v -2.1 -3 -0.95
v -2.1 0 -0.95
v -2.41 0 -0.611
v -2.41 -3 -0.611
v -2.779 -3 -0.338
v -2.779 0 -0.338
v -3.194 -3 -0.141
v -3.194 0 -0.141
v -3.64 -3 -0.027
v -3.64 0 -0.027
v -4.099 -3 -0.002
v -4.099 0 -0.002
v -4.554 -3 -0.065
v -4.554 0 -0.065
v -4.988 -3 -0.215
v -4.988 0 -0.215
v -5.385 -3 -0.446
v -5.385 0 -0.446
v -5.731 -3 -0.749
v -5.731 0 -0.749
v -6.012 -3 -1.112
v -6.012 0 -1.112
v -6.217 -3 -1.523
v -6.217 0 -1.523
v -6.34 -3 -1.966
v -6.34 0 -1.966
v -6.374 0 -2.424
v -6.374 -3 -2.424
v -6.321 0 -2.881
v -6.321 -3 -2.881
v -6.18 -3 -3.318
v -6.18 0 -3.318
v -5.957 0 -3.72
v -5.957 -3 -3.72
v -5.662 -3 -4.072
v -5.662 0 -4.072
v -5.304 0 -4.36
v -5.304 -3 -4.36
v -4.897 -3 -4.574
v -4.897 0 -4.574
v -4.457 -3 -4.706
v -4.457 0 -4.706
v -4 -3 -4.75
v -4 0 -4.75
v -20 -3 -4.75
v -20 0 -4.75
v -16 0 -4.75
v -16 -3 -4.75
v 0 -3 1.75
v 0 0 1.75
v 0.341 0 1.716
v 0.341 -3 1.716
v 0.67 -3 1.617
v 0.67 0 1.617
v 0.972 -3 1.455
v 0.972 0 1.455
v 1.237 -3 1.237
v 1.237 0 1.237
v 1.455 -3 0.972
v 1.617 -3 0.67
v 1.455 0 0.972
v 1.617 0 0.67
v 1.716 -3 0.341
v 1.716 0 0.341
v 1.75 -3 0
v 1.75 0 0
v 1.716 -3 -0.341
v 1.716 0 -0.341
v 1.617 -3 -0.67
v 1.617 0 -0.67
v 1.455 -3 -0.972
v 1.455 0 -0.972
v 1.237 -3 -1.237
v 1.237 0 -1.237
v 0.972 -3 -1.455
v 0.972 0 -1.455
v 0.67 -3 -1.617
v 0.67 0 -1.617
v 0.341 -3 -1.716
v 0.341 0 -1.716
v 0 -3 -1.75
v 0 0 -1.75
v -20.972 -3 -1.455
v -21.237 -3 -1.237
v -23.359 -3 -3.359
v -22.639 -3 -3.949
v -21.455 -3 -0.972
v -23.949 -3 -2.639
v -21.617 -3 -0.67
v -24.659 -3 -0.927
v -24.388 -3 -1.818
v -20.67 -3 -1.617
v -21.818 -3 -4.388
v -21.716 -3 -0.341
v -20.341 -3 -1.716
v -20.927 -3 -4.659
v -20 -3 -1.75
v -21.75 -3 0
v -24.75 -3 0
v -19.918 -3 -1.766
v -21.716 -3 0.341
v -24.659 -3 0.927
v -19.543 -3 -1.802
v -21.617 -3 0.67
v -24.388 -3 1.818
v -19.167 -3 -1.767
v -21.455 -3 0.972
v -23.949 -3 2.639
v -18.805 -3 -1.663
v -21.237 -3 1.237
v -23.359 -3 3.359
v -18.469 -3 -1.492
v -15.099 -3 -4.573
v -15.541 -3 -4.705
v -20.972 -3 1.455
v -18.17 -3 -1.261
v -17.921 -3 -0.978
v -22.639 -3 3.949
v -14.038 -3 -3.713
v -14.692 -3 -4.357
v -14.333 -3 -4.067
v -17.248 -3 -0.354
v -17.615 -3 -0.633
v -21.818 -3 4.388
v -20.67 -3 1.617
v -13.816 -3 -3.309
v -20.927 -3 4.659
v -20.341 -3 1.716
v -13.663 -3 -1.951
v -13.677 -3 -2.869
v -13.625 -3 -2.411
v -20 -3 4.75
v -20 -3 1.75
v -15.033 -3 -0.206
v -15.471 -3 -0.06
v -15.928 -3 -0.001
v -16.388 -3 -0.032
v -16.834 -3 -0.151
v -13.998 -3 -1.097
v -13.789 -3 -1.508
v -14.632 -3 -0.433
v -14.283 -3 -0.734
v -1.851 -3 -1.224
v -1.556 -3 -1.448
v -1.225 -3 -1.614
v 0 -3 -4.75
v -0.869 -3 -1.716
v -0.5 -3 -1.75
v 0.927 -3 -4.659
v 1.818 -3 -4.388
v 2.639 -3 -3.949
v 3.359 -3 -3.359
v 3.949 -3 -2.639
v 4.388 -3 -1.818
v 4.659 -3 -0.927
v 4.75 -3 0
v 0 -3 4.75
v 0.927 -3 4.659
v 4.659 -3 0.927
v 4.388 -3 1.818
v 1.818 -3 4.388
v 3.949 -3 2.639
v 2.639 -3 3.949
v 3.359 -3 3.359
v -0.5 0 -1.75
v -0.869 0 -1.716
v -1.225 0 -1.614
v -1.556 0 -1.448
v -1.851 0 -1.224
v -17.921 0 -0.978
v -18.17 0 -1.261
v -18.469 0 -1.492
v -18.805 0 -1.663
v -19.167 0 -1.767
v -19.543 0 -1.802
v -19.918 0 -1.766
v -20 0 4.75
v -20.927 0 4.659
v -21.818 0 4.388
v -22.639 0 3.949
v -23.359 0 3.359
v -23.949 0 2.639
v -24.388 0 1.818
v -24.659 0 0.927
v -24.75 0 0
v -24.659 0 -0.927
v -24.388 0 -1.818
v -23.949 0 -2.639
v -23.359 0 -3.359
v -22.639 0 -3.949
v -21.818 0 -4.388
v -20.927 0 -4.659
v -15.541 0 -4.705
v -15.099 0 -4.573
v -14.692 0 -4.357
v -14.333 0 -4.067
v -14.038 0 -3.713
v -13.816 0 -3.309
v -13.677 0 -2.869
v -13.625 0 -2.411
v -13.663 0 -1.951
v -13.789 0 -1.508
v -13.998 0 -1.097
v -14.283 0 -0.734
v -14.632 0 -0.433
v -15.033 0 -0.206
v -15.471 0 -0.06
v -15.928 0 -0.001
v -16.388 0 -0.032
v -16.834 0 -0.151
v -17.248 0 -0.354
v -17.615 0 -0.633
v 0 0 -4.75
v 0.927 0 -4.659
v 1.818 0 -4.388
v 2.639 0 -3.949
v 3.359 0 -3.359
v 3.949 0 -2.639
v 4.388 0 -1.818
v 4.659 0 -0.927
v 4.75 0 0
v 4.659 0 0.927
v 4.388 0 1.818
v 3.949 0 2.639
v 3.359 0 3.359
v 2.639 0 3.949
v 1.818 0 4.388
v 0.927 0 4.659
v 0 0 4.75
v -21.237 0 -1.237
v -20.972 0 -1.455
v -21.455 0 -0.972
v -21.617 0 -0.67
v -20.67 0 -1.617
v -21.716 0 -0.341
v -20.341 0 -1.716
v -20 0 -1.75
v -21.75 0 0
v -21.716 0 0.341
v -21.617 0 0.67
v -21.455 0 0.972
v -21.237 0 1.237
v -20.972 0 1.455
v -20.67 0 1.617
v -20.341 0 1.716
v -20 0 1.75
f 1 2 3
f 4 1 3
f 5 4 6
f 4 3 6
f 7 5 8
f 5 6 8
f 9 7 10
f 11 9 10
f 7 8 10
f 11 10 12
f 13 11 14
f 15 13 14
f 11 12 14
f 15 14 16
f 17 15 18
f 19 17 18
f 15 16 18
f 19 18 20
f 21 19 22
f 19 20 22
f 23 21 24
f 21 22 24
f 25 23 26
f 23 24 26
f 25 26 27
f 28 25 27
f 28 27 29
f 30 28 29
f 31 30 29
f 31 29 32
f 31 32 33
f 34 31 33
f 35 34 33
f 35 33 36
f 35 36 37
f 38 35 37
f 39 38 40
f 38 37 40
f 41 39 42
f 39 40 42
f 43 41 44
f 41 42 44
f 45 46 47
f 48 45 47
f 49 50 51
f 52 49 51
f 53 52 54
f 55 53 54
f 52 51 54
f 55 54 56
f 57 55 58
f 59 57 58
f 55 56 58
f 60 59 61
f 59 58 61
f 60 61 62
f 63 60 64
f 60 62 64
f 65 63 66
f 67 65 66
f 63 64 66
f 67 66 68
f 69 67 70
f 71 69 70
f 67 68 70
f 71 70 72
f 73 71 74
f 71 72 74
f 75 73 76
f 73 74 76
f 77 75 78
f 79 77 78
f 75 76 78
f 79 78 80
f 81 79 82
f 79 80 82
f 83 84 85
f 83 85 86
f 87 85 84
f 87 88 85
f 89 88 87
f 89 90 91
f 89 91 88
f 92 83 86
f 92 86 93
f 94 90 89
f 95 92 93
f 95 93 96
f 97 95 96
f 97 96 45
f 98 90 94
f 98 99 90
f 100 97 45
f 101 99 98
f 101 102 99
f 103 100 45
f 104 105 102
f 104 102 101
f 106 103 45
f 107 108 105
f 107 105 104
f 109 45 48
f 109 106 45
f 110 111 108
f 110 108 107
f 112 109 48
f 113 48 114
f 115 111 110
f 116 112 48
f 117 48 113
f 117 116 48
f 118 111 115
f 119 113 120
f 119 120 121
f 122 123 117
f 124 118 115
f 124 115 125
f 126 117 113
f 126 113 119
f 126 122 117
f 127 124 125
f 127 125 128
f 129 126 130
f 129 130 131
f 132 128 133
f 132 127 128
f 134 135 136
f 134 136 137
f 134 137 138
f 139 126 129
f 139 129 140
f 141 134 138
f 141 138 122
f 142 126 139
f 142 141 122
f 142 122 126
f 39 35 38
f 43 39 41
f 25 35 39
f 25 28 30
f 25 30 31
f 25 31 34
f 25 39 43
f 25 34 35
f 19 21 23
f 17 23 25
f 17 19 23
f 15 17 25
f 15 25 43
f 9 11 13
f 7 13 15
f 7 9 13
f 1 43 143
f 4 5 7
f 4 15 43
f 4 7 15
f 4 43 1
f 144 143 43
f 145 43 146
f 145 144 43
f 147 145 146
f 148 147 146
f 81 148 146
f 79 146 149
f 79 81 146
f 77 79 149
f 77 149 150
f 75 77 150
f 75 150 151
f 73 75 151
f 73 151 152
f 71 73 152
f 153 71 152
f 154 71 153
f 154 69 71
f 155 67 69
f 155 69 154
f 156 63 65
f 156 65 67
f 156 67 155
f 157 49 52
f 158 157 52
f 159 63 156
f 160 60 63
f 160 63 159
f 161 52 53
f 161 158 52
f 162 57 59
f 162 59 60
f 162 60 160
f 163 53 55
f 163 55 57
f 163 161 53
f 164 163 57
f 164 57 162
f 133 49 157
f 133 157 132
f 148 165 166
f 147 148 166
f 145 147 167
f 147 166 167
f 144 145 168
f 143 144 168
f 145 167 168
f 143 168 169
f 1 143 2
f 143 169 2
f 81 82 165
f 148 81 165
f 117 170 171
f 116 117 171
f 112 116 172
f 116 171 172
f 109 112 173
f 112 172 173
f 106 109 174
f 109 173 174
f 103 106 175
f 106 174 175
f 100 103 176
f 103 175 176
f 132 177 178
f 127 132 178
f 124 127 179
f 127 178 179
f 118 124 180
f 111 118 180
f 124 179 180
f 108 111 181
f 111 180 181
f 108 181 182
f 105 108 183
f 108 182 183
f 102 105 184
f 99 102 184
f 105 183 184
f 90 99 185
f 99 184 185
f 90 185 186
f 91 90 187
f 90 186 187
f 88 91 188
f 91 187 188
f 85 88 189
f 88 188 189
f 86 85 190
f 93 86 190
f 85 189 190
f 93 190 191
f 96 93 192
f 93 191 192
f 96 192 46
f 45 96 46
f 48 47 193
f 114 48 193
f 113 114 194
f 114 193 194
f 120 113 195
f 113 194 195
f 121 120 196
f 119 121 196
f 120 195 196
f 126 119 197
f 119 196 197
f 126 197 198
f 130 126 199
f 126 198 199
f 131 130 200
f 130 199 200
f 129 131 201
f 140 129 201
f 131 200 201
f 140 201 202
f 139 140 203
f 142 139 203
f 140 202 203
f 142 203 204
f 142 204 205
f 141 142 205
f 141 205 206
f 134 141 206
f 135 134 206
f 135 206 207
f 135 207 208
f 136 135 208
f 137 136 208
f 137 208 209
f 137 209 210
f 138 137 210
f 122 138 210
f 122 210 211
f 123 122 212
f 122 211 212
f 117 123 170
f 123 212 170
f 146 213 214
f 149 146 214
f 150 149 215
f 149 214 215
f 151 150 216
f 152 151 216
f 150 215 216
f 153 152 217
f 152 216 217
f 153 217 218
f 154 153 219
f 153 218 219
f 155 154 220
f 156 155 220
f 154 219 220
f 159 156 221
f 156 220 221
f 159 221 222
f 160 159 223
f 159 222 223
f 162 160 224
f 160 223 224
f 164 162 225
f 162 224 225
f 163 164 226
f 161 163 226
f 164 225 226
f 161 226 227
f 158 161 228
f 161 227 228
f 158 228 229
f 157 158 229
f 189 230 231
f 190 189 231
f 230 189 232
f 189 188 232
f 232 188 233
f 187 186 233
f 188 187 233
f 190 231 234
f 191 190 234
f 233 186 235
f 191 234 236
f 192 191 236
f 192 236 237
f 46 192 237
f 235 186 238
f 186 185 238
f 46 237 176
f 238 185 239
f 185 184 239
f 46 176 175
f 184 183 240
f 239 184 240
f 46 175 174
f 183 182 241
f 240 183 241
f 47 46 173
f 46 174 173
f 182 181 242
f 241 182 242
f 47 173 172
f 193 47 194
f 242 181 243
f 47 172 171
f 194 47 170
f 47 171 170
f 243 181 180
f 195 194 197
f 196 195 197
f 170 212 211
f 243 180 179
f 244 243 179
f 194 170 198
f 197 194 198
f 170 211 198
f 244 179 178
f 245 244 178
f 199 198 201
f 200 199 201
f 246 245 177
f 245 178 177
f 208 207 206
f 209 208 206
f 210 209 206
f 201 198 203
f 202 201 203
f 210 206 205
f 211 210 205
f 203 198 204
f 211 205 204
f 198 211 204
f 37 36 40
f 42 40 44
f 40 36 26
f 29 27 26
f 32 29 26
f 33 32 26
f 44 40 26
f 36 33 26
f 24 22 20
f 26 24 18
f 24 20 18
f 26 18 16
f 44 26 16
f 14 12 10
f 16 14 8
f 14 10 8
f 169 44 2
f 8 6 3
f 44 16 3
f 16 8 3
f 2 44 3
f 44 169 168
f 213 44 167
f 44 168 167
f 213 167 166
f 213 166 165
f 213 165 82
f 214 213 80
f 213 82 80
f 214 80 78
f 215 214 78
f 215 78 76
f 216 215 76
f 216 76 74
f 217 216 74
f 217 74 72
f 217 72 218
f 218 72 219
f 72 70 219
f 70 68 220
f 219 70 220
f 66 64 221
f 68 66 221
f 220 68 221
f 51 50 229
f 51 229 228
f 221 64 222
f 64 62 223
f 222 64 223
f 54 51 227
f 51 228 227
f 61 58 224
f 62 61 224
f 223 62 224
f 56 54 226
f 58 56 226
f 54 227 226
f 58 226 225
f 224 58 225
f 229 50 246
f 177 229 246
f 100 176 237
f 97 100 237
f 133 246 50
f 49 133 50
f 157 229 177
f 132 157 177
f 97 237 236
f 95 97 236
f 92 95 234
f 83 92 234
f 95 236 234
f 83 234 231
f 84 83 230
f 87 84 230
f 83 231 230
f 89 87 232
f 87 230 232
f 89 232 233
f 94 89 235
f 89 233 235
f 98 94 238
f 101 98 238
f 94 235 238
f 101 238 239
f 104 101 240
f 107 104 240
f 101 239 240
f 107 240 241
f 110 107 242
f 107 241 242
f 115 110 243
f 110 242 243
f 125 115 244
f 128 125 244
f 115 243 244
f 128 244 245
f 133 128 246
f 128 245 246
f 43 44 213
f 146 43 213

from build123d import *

# Parameters (mm, degrees)
F1_DEPTH = 3


with BuildPart() as f1:
    # F0 (on Front) → F1 (new body)
    with BuildSketch(Plane.XZ):
        with BuildLine():
            ThreePointArc((0, 1.75), (1.75, 0), (0, -1.75))
            Line((0, -1.75), (-0.5, -1.75))
            ThreePointArc((-0.5, -1.75), (-1.394427, -1.538854), (-2.1, -0.95))
            ThreePointArc((-2.1, -0.95), (-6.124265, -1.312868), (-4, -4.75))
            Line((-4, -4.75), (0, -4.75))
            ThreePointArc((0, -4.75), (4.75, 0), (0, 4.75))
            Line((0, 4.75), (-20, 4.75))
            ThreePointArc((-20, 4.75), (-24.75, 0), (-20, -4.75))
            Line((-20, -4.75), (-16, -4.75))
            ThreePointArc((-16, -4.75), (-13.883666, -1.297152), (-17.920914, -0.978321))
            ThreePointArc((-17.920914, -0.978321), (-18.804769, -1.662707), (-19.917848, -1.765869))
            Line((-19.917848, -1.765869), (-20, -1.75))
            ThreePointArc((-20, -1.75), (-21.75, 0), (-20, 1.75))
            Line((-20, 1.75), (0, 1.75))
        make_face()
    extrude(amount=F1_DEPTH)


solid = f1.part
